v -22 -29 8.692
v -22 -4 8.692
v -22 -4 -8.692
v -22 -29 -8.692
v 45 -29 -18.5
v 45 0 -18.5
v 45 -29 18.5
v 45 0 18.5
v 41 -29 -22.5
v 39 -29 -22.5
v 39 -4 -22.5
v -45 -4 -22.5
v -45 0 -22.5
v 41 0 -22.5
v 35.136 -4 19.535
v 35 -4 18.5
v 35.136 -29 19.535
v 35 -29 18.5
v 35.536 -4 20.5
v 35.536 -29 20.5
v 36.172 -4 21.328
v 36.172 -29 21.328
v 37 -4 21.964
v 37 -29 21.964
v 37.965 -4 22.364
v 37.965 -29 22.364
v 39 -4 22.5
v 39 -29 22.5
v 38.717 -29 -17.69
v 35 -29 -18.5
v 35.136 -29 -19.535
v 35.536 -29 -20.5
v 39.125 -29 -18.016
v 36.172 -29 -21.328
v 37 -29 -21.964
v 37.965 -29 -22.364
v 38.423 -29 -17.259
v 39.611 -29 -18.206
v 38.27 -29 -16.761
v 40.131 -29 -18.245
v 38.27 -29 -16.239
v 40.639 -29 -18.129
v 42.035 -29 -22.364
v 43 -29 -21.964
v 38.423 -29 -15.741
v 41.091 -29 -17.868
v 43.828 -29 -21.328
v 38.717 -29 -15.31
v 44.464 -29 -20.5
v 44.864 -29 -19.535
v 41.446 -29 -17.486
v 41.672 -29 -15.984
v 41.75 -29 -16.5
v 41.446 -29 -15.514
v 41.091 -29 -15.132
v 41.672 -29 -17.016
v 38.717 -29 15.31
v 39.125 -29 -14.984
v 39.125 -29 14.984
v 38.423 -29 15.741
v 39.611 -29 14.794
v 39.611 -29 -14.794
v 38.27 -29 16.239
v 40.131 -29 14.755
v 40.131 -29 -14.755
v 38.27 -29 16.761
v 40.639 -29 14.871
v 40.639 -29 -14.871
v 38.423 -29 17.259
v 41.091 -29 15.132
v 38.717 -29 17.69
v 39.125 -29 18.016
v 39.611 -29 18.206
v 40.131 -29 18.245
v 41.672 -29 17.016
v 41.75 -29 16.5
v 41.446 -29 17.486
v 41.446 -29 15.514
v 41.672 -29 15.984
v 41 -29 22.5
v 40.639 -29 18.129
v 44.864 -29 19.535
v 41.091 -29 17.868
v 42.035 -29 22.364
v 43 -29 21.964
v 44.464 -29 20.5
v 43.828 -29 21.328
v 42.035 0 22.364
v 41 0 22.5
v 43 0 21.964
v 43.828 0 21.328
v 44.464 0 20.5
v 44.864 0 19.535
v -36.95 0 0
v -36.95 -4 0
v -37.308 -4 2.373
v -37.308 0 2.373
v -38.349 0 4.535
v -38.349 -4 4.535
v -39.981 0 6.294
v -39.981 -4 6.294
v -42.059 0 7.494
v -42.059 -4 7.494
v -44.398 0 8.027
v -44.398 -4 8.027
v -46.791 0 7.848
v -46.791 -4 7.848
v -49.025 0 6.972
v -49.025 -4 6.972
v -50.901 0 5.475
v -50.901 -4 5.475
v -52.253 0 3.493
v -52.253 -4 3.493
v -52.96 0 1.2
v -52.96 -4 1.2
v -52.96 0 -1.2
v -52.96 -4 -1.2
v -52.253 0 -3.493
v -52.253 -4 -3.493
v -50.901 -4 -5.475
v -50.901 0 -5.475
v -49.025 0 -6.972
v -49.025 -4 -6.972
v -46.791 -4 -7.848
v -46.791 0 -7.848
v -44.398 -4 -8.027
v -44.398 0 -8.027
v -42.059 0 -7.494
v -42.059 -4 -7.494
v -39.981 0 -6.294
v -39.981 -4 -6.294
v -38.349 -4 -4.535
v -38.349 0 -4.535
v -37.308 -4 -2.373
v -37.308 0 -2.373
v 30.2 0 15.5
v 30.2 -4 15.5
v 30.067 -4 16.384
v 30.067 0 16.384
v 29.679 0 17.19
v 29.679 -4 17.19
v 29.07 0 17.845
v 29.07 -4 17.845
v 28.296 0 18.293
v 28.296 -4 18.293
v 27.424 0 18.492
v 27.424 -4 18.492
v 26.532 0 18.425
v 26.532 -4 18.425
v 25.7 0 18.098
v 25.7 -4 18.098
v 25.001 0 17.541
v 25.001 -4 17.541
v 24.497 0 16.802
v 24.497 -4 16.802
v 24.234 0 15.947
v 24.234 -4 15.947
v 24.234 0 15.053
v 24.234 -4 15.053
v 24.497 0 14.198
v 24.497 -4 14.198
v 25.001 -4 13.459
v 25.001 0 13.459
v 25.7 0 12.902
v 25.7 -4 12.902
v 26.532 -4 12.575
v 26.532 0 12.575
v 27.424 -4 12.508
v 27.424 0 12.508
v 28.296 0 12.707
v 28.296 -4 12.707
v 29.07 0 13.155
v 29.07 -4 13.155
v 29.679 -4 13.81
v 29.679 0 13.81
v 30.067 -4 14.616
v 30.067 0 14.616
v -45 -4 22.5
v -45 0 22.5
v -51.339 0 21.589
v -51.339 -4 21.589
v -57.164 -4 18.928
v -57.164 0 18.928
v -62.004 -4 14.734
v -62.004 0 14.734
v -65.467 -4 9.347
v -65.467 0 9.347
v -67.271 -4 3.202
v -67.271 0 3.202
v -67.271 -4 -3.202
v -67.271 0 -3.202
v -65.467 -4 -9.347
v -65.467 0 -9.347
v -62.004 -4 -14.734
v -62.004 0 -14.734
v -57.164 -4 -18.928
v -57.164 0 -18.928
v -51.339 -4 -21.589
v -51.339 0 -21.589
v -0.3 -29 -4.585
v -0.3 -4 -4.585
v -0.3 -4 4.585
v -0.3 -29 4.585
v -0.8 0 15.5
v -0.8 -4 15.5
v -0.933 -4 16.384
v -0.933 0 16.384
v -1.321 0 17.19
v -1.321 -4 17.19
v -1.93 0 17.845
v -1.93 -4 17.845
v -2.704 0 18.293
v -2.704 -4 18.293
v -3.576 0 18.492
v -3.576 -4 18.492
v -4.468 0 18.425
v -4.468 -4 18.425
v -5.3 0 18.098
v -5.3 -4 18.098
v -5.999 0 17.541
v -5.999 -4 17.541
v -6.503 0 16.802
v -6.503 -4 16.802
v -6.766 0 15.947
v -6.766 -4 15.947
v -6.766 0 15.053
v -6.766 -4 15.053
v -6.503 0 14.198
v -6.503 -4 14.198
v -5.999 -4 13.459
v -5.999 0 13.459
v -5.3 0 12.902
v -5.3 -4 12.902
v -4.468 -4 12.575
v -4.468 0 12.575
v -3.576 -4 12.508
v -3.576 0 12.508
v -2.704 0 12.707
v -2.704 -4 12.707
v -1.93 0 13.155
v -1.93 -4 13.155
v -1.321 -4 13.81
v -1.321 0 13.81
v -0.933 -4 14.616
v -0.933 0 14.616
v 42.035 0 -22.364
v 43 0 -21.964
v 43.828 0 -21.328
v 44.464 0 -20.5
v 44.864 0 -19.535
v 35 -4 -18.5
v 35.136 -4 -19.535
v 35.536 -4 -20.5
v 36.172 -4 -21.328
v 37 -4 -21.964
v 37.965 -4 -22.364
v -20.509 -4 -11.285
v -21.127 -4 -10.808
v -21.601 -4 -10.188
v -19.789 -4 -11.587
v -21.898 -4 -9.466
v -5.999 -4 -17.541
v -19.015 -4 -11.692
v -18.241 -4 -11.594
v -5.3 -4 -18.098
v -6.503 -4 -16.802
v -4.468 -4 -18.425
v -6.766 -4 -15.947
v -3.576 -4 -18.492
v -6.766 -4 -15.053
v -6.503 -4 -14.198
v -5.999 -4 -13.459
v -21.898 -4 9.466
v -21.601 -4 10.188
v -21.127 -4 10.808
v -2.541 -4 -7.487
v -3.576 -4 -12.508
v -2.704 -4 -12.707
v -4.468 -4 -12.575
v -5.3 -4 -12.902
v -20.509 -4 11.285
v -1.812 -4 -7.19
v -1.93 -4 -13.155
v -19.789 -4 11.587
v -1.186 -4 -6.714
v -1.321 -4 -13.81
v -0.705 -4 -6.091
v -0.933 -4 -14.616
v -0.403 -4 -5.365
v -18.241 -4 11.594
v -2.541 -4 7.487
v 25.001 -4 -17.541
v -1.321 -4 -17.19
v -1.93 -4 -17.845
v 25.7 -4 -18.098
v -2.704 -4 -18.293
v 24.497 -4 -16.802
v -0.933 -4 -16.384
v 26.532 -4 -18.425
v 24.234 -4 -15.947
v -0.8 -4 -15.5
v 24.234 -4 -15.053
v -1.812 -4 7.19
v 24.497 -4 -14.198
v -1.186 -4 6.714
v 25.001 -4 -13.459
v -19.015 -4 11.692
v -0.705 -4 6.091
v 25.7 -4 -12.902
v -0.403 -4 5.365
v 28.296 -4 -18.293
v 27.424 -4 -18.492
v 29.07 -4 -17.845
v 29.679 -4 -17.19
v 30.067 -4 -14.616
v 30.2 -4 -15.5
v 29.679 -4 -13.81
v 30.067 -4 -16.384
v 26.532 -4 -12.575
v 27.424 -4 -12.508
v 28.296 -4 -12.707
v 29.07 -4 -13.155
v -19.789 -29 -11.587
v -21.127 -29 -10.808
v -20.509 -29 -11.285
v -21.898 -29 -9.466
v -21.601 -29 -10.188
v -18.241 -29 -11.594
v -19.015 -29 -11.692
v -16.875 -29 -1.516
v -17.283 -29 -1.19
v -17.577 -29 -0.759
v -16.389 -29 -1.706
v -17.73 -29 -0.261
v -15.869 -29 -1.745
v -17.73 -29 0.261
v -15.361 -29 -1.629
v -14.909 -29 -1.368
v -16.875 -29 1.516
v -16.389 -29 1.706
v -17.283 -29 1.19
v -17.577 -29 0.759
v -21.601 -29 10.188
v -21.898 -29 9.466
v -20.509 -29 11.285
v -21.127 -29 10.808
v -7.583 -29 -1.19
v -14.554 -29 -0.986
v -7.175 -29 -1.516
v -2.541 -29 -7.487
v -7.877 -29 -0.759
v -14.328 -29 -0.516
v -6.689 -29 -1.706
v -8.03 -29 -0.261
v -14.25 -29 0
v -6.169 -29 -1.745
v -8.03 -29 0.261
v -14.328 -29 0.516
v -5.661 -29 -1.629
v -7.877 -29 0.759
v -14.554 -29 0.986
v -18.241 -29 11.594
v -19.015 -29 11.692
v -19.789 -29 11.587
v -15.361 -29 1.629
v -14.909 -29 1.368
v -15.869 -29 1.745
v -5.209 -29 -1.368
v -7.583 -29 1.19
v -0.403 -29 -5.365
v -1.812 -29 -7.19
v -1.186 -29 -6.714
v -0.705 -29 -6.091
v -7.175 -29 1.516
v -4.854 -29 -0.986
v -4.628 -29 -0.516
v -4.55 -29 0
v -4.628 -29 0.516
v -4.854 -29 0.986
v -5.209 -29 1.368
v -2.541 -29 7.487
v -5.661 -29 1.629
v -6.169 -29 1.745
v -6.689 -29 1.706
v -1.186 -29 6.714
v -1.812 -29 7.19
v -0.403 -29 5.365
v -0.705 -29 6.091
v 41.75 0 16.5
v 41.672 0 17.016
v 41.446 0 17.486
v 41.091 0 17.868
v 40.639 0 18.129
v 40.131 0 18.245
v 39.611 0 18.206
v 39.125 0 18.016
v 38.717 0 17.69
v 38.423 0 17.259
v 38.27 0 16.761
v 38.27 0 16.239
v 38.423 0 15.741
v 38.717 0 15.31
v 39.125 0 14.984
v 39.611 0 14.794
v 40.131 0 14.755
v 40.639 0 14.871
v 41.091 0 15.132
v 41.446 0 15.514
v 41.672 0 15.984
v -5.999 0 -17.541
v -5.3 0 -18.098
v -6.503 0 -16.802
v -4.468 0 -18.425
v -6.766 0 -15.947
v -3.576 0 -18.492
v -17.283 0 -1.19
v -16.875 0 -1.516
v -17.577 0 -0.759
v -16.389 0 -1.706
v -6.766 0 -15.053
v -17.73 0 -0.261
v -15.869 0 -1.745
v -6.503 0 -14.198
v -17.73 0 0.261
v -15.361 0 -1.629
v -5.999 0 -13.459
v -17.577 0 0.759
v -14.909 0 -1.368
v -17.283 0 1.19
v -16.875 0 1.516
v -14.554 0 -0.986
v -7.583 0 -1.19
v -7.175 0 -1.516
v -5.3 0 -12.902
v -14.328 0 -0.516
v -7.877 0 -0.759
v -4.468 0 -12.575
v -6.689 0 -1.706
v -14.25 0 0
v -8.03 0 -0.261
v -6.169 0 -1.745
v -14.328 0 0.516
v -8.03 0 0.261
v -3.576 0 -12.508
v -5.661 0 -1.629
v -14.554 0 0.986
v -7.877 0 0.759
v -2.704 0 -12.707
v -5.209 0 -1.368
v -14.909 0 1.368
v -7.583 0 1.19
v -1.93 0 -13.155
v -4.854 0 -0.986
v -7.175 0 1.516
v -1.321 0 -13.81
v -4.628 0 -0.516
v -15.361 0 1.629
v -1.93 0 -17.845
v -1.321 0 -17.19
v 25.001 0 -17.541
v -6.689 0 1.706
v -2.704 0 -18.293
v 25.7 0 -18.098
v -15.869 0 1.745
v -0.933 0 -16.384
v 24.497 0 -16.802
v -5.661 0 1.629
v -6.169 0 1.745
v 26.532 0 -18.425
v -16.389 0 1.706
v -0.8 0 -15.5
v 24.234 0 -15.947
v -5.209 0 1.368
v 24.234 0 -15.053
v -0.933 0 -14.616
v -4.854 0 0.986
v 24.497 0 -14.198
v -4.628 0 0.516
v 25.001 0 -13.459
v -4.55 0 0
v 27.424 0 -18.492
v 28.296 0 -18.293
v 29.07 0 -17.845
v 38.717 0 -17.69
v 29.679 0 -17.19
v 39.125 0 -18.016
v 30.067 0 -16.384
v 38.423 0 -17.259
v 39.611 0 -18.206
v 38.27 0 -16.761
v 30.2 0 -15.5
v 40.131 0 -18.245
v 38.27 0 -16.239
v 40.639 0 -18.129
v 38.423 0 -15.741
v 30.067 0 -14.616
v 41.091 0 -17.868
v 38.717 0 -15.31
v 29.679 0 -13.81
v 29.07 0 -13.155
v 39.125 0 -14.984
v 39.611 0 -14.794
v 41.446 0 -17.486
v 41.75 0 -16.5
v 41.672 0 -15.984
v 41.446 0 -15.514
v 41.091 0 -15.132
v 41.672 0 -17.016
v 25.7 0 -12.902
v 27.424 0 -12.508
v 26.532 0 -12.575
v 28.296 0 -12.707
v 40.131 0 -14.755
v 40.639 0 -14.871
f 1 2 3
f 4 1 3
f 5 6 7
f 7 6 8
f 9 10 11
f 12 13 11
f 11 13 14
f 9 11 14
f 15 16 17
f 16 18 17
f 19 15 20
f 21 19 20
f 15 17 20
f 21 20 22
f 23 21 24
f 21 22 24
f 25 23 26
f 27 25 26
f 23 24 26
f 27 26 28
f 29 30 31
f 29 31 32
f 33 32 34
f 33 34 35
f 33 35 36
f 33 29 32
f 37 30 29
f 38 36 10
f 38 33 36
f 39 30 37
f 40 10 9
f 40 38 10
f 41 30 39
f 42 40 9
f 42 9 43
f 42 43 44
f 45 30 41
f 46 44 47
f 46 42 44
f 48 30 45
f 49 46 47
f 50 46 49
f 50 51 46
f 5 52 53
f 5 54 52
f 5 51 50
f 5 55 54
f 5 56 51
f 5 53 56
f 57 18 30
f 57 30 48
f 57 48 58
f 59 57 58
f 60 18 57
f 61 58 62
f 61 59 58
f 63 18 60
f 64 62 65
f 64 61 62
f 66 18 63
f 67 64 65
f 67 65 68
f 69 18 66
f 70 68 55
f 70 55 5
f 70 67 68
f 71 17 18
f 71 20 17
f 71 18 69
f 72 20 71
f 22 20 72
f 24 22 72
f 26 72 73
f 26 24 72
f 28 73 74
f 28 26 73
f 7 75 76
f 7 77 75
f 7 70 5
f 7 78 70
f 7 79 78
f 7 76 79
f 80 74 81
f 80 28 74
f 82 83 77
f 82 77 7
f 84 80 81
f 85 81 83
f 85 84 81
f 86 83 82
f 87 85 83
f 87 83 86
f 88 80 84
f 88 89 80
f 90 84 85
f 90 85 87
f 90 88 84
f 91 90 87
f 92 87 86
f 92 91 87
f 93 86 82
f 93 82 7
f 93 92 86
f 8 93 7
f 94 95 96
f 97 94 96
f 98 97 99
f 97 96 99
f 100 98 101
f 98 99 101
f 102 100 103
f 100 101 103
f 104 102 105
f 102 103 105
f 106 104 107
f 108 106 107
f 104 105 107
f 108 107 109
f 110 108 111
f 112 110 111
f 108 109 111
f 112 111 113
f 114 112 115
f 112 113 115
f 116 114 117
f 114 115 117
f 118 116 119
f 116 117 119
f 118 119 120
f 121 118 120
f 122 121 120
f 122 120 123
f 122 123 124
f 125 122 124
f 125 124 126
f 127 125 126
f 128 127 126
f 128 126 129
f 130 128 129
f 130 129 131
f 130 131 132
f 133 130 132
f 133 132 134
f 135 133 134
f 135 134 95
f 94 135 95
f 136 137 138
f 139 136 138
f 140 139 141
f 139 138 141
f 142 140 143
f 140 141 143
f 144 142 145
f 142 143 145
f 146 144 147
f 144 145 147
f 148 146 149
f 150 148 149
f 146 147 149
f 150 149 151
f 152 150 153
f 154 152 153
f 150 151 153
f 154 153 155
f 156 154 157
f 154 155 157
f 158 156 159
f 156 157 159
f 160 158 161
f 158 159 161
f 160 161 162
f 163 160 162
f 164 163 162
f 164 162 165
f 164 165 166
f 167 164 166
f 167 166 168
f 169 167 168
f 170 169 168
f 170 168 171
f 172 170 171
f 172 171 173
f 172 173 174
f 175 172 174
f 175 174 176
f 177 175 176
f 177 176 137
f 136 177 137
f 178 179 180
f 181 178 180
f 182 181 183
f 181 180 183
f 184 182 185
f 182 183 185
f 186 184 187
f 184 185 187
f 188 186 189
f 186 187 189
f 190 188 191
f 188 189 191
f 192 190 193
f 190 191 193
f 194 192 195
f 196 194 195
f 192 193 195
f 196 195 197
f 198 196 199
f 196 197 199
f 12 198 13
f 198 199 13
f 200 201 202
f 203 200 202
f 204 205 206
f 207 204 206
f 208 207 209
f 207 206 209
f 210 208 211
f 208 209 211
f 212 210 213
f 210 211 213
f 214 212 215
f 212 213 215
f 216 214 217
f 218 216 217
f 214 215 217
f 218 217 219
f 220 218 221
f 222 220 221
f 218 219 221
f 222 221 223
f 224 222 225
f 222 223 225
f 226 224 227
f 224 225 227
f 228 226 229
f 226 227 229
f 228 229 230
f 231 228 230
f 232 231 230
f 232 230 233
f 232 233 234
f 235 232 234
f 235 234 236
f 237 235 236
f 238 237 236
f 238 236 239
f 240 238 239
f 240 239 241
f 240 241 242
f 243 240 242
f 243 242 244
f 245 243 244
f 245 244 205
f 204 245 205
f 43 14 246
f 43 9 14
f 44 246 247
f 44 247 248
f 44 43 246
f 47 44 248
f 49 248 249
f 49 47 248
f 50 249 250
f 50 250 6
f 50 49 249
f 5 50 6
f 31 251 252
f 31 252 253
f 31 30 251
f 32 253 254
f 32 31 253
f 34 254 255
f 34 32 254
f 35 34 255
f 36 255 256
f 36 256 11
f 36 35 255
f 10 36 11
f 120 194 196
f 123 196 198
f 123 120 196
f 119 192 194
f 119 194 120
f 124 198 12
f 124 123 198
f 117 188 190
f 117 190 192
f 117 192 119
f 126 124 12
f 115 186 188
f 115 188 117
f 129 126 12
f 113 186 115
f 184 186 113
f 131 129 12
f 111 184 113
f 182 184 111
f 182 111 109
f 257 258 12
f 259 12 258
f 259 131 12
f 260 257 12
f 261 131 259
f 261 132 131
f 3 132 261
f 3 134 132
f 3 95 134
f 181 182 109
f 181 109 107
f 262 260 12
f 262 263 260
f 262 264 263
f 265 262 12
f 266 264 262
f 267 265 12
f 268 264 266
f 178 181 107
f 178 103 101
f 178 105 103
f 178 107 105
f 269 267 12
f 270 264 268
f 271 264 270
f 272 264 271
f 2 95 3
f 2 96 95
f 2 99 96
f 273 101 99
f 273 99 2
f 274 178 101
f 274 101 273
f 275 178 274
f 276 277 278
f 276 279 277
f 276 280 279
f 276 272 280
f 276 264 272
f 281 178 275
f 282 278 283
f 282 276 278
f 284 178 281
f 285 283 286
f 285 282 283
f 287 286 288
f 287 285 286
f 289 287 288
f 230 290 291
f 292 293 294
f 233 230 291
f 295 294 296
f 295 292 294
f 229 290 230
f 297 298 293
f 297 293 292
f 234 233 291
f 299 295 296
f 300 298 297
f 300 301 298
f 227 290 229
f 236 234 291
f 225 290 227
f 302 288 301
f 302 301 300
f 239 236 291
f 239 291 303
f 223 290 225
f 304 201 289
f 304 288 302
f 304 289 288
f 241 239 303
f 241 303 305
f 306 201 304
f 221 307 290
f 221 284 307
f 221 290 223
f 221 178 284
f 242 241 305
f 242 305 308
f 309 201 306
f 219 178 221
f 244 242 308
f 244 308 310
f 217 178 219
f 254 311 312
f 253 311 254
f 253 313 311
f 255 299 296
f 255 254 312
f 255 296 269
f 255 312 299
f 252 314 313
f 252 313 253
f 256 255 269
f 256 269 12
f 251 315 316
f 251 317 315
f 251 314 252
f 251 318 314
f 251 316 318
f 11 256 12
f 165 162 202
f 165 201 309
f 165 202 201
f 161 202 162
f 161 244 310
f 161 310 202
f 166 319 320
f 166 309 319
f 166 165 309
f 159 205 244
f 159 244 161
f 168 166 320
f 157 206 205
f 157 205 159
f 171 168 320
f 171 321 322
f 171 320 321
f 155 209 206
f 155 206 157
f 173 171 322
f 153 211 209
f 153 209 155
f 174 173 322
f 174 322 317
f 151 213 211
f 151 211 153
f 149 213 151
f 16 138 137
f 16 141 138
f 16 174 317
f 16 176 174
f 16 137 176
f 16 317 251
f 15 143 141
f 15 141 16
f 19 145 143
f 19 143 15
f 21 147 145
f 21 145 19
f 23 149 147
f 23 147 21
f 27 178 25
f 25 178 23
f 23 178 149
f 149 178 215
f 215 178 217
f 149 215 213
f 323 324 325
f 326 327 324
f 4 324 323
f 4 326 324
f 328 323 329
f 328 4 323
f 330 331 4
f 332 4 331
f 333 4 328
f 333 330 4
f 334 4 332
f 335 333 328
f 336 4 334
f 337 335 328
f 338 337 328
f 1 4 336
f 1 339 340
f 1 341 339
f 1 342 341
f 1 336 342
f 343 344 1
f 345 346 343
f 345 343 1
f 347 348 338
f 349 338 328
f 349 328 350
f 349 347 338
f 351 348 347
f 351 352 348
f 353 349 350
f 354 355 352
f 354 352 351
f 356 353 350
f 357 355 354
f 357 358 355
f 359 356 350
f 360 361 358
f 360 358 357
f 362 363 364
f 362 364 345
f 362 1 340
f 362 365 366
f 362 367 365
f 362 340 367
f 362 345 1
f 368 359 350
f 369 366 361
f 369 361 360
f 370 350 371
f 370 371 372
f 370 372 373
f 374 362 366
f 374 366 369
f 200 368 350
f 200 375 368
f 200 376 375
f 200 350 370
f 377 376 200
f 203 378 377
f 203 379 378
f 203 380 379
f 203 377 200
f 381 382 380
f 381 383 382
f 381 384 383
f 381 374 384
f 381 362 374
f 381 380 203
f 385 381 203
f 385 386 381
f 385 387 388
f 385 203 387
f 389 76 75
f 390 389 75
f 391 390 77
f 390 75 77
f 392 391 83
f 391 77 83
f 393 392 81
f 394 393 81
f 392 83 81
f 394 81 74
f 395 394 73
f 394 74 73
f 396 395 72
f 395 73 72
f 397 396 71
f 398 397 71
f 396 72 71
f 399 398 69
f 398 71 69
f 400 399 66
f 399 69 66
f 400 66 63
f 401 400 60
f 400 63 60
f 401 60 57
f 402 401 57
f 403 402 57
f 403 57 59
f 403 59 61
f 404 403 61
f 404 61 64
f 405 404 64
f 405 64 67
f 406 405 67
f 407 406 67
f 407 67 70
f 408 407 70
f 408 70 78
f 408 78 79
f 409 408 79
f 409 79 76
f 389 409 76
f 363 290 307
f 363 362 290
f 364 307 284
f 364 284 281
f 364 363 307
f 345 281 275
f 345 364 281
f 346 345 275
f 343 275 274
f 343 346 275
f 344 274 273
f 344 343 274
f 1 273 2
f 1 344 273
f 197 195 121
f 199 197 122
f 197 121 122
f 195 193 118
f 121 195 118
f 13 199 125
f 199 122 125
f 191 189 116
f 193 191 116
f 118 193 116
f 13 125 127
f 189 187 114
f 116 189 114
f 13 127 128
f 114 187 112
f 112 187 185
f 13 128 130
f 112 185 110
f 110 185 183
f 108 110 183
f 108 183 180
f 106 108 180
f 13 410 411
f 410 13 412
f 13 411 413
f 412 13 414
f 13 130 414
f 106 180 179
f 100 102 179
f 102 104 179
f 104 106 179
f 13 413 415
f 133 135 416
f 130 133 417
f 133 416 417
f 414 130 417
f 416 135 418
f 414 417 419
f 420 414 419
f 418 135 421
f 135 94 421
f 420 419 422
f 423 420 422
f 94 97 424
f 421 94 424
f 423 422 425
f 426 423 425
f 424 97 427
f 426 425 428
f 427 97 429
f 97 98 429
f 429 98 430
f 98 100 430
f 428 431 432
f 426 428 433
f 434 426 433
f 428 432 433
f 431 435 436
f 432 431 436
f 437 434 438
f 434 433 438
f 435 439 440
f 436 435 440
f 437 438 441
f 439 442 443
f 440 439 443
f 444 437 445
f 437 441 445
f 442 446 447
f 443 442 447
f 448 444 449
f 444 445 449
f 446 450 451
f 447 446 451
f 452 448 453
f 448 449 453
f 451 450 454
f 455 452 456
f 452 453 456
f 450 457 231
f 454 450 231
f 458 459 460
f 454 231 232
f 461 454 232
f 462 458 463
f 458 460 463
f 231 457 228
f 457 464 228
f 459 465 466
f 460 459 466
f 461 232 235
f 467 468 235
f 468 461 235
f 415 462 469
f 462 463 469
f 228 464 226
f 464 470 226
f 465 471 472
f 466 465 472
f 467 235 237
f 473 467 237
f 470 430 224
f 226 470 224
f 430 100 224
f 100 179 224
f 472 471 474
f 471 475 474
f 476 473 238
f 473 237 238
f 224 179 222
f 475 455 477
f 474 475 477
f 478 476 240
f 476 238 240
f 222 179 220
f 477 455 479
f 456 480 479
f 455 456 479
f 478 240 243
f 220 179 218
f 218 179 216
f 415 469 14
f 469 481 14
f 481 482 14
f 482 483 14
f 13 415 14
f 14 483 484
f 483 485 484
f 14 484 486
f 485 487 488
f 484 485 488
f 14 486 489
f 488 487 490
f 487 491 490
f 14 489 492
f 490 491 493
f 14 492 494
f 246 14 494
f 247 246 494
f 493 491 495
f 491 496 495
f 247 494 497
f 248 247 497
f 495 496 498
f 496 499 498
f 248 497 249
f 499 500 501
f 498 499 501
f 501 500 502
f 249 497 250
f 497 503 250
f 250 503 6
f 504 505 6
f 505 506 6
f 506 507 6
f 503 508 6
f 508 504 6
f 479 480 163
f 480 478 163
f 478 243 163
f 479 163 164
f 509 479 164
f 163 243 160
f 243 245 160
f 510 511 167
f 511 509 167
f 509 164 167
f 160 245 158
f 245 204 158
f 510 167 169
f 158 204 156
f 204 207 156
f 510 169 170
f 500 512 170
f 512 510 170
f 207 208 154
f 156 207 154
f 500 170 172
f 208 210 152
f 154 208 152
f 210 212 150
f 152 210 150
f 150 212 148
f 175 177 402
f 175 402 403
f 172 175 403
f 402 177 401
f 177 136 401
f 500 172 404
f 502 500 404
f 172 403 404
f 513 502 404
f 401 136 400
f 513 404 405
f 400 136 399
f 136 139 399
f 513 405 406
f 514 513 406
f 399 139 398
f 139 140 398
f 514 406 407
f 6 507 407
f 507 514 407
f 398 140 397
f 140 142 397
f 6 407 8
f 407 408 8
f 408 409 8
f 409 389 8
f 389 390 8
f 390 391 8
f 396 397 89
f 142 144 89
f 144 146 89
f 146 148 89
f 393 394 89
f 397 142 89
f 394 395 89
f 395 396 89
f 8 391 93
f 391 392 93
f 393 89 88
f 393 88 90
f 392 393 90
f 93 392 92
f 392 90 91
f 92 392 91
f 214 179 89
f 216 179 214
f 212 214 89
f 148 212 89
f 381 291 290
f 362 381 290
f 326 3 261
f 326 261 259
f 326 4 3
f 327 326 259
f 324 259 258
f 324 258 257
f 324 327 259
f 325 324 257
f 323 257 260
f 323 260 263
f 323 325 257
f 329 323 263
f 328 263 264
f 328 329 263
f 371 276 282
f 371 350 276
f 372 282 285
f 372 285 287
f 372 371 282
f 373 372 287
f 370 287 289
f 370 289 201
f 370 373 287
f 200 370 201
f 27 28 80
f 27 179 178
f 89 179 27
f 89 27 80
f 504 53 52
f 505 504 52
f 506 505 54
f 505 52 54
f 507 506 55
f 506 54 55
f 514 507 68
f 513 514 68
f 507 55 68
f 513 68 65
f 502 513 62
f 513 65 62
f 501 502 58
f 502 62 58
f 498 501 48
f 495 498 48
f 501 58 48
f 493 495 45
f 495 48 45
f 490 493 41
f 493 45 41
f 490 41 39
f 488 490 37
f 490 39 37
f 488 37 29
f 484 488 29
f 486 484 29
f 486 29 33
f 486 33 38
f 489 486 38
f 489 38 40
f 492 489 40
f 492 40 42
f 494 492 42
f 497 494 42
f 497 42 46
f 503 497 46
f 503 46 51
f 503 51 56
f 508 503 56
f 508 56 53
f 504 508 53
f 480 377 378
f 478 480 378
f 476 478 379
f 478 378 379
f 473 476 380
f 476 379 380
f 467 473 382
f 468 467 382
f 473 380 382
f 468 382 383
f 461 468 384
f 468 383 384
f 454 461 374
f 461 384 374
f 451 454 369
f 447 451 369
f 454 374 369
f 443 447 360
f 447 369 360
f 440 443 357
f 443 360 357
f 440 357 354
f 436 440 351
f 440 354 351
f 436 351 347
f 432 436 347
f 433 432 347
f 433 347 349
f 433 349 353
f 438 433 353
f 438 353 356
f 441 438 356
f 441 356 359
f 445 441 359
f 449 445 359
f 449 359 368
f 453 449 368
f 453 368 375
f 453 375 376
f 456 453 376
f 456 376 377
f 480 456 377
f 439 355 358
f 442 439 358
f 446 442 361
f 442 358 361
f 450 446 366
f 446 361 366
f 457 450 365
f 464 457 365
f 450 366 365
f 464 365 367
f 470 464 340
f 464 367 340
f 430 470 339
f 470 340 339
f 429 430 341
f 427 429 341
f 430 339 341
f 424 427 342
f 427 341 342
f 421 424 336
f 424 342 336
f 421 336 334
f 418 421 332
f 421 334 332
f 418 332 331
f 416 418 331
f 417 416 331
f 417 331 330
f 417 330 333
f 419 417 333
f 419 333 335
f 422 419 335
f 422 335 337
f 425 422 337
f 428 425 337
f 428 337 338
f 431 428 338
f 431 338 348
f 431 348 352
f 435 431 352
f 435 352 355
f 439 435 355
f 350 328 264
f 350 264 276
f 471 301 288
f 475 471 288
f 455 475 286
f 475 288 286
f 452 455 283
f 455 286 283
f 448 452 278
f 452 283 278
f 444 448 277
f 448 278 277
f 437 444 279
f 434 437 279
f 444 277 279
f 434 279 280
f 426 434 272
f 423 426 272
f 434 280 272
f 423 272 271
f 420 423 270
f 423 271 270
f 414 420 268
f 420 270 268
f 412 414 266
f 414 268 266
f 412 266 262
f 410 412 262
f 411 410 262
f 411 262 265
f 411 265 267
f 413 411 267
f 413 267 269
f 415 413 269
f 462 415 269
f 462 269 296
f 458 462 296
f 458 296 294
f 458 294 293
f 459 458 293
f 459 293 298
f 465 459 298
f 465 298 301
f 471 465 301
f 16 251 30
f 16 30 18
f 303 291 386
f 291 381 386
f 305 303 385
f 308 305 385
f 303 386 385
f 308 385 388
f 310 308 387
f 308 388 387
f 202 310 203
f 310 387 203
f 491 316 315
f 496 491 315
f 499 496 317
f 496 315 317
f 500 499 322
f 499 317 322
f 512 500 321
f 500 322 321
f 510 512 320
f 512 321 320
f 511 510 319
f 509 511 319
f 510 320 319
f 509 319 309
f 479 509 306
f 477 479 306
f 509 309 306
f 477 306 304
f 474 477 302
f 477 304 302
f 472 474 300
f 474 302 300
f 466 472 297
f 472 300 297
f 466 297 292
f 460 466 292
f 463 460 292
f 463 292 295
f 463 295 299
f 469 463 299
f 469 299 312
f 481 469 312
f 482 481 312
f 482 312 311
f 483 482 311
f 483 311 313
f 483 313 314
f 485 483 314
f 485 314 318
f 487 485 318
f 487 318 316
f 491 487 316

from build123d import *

# Parameters (mm, degrees)
F1_DEPTH  = 4
F2_R      = 8.05
F3_DEPTH  = 4.001
F4_W      = 10
F4_H      = 45
F5_DEPTH  = 25
F6_R      = 1.75
F7_DEPTH  = 29.001
F8_R      = 1.75
F9_DEPTH  = 29.001
F10_R     = 3
F11_R     = 4
F12_R     = 3
F13_DEPTH = 4.001


with BuildPart() as f1:
    # F0 (on Front) → F1 (new body)
    with BuildSketch(Plane.XZ):
        with BuildLine():
            Line((45, 22.5), (-45, 22.5))
            ThreePointArc((-45, 22.5), (-67.5, 0), (-45, -22.5))
            Line((-45, -22.5), (45, -22.5))
            Line((45, -22.5), (45, 22.5))
        make_face()
    extrude(amount=F1_DEPTH)

    # F2 (on face) → F3 (cut, through all)
    with BuildSketch(Plane.XZ.offset(4)):
        with Locations((-45, 0)):
            Circle(F2_R)
    extrude(amount=-F3_DEPTH, mode=Mode.SUBTRACT)

    # F4 (on face) → F5 (join)
    with BuildSketch(Plane.XZ.offset(4)):
        Polygon((-0.3, 6.9010445144), (-22, 12.5778352683), (-22, 0), (-22, -12.5778352683), (-0.3, -6.9010445144), (-0.3, 0), align=None)
        with Locations((40, 0)):
            Rectangle(F4_W, F4_H)
    extrude(amount=F5_DEPTH)

    # F6 (on face) → F7 (cut, through all)
    with BuildSketch(Plane.XZ.offset(29)):
        with Locations((-16, 0)):
            Circle(F6_R)
        with Locations((-6.3, 0)):
            Circle(F6_R)
    extrude(amount=-F7_DEPTH, mode=Mode.SUBTRACT)

    # F8 (on face) → F9 (cut, through all)
    with BuildSketch(Plane.XZ.offset(29)):
        with Locations((40, 16.5)):
            Circle(F8_R)
        with Locations((40, -16.5)):
            Circle(F8_R)
    extrude(amount=-F9_DEPTH, mode=Mode.SUBTRACT)

    # F10
    f10_edges = [f1.edges().sort_by_distance(p)[0] for p in [
        (-0.3, -16.5, 6.901045),
        (-22, -16.5, 12.577835),
        (-22, -16.5, -12.577835),
        (-0.3, -16.5, -6.901045),
    ]]
    fillet(f10_edges, radius=F10_R)

    # F11
    f11_edges = [f1.edges().sort_by_distance(p)[0] for p in [
        (45, -14.5, 22.5),
        (45, -14.5, -22.5),
        (35, -16.5, 22.5),
        (35, -16.5, -22.5),
    ]]
    fillet(f11_edges, radius=F11_R)

    # F12 (on face) → F13 (cut, through all)
    with BuildSketch(Plane.XZ.offset(4)):
        with Locations((-3.8, 15.5)):
            Circle(F12_R)
        with Locations((-3.8, -15.5)):
            Circle(F12_R)
        with Locations((27.2, -15.5)):
            Circle(F12_R)
        with Locations((27.2, 15.5)):
            Circle(F12_R)
    extrude(amount=-F13_DEPTH, mode=Mode.SUBTRACT)


solid = f1.part
